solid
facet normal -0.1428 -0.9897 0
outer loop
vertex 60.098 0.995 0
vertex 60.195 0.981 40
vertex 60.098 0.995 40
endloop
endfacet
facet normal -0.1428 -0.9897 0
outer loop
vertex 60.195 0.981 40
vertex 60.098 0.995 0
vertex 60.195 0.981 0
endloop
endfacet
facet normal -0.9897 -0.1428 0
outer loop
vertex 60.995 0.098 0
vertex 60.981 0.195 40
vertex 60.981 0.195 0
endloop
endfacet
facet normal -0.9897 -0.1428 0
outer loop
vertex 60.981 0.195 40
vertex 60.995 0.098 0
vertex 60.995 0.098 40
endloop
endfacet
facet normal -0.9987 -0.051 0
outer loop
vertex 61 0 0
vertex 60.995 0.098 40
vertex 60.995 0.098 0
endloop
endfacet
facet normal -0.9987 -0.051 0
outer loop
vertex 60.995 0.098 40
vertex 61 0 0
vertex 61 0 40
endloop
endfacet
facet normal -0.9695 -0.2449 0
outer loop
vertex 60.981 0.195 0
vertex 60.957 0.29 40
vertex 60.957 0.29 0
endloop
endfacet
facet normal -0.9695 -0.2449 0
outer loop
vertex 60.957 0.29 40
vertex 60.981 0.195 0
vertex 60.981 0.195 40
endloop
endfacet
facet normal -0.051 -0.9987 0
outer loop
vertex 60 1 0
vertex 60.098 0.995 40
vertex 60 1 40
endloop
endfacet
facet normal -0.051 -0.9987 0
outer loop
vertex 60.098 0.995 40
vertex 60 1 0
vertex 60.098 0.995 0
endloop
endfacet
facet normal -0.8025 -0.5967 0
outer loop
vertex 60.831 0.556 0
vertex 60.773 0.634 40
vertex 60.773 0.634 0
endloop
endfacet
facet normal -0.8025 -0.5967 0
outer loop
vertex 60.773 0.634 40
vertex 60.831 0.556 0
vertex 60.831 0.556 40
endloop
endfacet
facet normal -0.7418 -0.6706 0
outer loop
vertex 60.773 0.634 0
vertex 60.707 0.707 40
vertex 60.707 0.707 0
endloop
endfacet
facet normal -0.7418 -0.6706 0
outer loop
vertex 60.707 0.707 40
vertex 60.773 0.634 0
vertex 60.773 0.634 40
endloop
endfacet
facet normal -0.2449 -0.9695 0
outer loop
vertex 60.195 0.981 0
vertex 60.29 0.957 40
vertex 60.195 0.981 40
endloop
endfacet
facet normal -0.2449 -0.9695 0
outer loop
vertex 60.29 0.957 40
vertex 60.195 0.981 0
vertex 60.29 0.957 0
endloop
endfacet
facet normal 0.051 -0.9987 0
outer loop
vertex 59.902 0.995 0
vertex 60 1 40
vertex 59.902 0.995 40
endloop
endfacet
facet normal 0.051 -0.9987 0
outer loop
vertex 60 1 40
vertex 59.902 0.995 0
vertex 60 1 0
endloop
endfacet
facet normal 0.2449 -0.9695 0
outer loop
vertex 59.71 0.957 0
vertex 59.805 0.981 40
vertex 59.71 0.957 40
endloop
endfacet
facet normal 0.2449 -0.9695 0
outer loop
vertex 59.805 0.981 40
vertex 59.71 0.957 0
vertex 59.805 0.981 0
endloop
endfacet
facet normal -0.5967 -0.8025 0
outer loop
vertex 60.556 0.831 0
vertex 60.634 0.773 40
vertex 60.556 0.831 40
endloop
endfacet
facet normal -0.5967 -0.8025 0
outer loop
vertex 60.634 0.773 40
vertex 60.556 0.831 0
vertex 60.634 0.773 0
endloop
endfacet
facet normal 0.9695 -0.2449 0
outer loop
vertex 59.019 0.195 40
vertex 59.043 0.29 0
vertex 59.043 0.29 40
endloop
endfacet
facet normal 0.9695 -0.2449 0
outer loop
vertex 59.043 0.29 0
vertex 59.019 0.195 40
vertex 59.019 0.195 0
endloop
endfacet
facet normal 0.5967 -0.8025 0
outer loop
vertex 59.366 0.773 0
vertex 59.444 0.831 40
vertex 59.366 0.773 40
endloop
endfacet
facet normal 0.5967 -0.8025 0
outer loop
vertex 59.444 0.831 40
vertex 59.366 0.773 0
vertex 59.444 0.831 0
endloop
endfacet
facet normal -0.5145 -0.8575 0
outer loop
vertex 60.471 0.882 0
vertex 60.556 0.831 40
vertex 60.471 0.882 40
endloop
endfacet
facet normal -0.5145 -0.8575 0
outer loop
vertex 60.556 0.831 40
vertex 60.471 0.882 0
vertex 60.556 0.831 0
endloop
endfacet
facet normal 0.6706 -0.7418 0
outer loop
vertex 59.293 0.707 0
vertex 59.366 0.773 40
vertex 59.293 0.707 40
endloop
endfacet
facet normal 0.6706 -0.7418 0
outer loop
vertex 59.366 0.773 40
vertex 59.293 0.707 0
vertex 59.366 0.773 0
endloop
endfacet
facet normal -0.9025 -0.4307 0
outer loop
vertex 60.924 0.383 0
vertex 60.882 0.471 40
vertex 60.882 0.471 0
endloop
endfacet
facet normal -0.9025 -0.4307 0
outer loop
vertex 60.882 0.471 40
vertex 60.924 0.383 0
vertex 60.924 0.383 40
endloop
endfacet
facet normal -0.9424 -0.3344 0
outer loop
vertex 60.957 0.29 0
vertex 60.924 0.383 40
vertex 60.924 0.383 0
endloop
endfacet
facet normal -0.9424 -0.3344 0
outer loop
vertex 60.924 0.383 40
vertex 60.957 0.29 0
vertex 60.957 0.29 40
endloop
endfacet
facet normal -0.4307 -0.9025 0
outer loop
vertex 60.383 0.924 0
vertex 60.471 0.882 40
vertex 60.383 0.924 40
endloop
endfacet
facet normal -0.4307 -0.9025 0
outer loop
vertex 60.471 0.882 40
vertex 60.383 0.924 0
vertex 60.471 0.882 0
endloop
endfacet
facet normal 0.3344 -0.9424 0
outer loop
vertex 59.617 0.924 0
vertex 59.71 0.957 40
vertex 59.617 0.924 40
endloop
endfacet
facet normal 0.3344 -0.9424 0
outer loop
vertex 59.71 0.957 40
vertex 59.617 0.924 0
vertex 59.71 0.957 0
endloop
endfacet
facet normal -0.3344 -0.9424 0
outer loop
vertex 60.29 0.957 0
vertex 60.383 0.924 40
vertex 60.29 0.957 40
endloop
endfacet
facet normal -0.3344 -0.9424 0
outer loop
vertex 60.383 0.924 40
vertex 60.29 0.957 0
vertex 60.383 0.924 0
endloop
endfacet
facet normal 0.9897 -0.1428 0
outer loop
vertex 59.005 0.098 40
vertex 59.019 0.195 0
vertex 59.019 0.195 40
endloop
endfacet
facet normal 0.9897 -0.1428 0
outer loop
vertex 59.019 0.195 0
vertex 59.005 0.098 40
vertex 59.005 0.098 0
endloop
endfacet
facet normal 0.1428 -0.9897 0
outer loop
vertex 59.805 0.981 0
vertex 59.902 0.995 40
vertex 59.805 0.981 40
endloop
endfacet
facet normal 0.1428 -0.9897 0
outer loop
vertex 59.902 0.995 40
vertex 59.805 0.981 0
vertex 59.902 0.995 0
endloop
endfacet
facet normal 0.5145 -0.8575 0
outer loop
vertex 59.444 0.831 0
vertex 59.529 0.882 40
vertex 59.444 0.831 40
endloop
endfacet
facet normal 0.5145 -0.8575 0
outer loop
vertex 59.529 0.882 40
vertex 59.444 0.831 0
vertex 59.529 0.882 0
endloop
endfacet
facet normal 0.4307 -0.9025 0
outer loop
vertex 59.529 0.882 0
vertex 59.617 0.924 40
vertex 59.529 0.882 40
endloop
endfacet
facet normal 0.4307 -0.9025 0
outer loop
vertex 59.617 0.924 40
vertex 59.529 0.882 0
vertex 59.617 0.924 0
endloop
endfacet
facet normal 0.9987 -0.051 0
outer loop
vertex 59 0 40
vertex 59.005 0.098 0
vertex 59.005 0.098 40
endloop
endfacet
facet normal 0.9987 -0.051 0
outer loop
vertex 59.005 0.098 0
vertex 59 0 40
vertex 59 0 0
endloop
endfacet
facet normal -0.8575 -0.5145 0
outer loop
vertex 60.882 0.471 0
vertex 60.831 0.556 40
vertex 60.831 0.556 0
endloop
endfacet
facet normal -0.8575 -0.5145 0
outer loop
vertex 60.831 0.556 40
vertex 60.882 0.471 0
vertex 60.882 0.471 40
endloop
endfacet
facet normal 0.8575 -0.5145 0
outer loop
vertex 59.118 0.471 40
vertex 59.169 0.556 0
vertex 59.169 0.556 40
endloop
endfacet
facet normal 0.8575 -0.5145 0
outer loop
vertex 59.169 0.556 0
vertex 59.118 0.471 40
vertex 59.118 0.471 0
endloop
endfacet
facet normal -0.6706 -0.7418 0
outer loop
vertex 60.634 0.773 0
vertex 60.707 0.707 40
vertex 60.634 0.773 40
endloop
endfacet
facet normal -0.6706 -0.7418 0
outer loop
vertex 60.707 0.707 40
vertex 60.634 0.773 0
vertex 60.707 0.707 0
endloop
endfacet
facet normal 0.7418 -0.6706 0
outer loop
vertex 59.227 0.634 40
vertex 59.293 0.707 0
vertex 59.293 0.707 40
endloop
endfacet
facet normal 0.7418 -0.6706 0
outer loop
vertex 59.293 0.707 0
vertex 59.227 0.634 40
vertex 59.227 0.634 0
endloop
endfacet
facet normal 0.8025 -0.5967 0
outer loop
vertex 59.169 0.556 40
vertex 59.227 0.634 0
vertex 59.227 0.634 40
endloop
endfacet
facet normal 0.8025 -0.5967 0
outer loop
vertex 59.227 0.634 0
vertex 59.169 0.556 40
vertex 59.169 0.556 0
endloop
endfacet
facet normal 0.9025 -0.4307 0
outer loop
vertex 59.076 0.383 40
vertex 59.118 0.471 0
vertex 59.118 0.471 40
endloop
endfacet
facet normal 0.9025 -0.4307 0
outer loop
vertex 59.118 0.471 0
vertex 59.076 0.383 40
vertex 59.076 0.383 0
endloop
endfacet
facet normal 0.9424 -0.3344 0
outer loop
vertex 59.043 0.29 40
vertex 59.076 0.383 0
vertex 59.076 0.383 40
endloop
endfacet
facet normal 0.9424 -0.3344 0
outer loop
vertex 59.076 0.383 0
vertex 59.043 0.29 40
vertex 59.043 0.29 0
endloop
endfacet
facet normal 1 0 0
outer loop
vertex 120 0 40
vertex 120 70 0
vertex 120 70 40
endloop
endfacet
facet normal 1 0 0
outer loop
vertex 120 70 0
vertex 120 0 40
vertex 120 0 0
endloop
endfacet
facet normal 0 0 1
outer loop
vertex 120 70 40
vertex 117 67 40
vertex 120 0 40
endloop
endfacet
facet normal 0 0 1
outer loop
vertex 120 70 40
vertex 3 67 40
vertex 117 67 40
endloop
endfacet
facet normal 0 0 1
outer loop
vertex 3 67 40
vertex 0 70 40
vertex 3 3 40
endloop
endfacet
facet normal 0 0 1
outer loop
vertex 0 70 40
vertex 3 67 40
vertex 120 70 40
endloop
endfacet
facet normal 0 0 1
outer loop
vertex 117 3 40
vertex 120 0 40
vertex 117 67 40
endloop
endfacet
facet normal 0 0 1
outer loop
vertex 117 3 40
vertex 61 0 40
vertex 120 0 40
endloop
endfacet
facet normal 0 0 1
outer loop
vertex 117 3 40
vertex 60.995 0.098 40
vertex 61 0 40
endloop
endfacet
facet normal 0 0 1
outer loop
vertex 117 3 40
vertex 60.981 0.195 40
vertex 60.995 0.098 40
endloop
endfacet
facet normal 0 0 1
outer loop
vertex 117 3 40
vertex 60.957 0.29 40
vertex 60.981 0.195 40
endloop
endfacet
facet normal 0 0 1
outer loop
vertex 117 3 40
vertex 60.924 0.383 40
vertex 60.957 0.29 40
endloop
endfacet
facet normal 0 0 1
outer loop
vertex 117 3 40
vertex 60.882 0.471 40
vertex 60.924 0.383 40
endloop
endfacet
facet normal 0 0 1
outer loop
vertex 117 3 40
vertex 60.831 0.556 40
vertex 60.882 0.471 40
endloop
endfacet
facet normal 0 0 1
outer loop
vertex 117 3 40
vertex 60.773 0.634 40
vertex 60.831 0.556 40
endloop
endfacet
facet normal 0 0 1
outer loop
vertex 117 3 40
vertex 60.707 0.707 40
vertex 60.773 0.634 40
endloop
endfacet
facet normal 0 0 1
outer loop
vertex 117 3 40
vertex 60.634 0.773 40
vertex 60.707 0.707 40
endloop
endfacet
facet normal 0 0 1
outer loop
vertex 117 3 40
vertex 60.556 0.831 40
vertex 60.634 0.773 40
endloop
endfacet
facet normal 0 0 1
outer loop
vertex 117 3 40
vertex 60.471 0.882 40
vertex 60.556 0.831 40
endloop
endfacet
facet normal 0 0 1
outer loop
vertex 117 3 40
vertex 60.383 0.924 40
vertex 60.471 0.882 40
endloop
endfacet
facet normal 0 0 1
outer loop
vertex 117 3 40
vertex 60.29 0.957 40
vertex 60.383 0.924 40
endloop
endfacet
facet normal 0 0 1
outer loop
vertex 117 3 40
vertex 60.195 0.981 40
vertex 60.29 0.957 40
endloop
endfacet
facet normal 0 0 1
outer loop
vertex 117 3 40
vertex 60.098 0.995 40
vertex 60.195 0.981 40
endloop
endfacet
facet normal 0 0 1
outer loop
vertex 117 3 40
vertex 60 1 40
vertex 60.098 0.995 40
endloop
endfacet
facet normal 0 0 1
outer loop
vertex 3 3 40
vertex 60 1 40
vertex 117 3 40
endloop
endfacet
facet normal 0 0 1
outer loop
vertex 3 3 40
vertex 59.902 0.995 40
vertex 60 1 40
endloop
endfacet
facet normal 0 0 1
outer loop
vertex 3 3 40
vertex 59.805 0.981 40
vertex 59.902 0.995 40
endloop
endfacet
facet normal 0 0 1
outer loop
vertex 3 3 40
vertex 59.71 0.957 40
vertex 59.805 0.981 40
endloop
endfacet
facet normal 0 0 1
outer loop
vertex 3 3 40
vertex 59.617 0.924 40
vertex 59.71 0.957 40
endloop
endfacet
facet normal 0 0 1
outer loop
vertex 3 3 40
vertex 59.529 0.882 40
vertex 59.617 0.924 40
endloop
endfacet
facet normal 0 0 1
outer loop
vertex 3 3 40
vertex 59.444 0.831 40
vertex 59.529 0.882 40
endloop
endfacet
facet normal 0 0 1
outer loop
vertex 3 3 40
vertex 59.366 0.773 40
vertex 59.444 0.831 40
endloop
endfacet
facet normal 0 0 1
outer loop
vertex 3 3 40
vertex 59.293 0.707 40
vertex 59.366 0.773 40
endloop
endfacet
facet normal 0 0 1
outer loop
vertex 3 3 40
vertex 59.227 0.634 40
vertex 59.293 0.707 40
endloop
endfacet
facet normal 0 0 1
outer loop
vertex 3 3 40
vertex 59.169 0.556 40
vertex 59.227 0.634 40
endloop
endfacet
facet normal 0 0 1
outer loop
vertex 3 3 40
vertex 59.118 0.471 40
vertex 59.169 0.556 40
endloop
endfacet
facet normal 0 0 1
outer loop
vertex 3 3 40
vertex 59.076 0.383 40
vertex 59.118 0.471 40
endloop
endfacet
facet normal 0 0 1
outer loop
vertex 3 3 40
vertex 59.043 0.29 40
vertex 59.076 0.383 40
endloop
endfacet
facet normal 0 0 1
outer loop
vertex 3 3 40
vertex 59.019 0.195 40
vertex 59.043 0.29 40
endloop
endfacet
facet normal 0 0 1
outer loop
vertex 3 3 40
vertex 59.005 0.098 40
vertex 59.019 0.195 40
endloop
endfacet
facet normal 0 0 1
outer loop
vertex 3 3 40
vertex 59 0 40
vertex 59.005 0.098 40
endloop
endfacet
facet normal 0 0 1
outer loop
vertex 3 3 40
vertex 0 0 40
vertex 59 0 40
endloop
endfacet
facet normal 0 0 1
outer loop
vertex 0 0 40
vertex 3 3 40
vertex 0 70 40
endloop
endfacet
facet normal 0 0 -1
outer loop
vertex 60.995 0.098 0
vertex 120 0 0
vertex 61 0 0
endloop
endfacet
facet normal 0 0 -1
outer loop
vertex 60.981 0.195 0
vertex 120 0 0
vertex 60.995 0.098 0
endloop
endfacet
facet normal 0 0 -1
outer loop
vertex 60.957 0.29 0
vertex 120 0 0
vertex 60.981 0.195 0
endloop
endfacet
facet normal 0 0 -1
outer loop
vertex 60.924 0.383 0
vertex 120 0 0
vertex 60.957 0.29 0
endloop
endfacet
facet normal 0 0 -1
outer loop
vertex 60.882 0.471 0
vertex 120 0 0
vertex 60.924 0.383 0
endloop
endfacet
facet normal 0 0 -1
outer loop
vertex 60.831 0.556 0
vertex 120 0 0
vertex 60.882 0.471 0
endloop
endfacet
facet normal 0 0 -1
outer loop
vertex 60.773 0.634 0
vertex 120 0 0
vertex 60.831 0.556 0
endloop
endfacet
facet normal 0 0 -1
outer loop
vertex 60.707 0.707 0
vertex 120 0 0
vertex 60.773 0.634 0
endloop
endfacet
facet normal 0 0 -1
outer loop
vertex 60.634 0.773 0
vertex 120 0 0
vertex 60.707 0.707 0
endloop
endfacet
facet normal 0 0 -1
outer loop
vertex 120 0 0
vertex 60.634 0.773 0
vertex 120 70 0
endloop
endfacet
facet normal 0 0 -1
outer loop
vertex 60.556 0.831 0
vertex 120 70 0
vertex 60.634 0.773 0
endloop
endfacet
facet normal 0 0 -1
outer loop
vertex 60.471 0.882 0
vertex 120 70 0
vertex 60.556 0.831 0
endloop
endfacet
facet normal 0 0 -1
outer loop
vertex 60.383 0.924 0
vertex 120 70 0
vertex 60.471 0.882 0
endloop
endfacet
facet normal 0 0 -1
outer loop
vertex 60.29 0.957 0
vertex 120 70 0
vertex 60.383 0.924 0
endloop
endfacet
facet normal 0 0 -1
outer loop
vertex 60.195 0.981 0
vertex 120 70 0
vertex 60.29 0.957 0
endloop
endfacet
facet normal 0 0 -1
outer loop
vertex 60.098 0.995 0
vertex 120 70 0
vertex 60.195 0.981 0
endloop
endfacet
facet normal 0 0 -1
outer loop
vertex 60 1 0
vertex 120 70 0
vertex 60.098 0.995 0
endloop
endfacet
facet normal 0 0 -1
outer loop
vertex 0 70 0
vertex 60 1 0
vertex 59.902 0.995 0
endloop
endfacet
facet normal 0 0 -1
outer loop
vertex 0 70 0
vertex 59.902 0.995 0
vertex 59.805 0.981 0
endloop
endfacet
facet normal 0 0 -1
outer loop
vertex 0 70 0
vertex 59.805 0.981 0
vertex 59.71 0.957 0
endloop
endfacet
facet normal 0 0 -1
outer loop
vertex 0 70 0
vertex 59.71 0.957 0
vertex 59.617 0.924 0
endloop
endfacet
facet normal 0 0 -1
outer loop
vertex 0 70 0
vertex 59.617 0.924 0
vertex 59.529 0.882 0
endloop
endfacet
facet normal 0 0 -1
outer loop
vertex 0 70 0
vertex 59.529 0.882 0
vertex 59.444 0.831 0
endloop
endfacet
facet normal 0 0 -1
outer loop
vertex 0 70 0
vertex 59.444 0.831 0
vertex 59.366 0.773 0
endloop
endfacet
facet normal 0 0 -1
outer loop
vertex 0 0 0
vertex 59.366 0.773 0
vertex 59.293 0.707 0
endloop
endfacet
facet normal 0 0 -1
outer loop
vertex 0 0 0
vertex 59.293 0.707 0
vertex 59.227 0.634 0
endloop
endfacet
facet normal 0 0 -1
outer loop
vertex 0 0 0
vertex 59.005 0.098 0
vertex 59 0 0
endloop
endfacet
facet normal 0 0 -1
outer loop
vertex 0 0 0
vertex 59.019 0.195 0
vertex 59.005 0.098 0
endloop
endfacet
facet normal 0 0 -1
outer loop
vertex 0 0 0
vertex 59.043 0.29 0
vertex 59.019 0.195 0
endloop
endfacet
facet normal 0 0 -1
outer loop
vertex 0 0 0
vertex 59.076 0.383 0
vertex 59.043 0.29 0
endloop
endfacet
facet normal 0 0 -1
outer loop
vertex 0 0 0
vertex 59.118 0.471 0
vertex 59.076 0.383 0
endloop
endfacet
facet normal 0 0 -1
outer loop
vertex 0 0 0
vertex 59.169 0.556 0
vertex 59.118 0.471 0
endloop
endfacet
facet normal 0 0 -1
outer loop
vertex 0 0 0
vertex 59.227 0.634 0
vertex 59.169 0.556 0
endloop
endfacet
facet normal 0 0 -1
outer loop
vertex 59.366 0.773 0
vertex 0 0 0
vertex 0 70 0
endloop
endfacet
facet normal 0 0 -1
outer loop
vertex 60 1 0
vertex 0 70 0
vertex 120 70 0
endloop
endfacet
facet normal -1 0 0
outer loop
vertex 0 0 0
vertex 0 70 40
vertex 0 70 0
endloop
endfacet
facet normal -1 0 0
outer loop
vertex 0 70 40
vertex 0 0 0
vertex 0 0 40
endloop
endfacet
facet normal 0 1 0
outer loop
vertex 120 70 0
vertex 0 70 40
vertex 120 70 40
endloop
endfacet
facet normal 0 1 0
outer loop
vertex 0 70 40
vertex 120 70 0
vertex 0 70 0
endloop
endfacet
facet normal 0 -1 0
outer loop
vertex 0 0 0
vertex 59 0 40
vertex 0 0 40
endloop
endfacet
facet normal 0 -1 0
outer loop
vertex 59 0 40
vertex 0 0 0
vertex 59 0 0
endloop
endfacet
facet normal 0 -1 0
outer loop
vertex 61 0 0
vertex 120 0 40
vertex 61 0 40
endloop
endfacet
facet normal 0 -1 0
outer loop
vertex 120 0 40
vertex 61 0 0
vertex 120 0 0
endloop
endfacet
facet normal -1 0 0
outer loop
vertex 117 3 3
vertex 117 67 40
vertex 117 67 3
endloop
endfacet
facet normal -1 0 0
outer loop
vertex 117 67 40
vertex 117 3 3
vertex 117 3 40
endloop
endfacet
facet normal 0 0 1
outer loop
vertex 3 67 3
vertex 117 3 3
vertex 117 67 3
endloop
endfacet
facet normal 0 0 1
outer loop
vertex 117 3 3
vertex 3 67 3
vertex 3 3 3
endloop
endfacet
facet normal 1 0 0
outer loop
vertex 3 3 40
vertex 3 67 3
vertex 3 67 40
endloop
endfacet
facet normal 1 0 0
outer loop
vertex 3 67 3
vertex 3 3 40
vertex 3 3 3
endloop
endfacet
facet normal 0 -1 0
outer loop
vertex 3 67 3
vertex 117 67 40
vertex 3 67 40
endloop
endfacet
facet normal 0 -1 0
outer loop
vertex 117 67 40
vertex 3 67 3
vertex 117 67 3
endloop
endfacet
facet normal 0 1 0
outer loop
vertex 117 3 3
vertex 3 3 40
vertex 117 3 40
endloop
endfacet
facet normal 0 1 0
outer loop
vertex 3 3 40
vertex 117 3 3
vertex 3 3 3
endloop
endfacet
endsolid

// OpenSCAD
$fn = 64;

// Outer dimensions (mm)
$outer_x = 120;
$outer_y = 70;
$outer_z = 40;

// Wall and floor thickness (mm)
$wall_thickness = 3;
$floor_thickness = 3;

// Inner dimensions (mm)
$inner_x = $outer_x - 2 * $wall_thickness;
$inner_y = $outer_y - 2 * $wall_thickness;
$inner_z = $outer_z - $floor_thickness;

// Platform dimensions (mm)
$platform_length = 60;
$platform_width = $inner_y;
$platform_height = 10;

// Hole dimensions (mm)
$hole_diameter = 2;
$hole_radius = $hole_diameter / 2;
$hole_z = 30;
$hole_y = 0;

difference() {
    // Main tank body (outer box)
    cube([
        $outer_x,
        $outer_y,
        $outer_z
    ], center = false);
    
    // Cut out inner cavity (open top)
    translate([
        $wall_thickness,
        $wall_thickness,
        $floor_thickness
    ])
    cube([
        $inner_x,
        $inner_y,
        $inner_z
    ], center = false);
    
    // Cut out platform cavity (space above platform)
    translate([
        ($outer_x - $platform_length) / 2,
        $wall_thickness,
        $floor_thickness + $platform_height
    ])
    cube([
        $platform_length,
        $platform_width,
        $outer_z - ($floor_thickness + $platform_height)
    ], center = false);
    
    // Cut out electrode holes (horizontal cylinders along X)
    for (side = [-1, 1]) {
        translate([
            side * ($outer_x / 2),
            $hole_y,
            $hole_z
        ])
        cylinder(
            r = $hole_radius,
            h = $outer_x + 0.1,
            axis = [1, 0, 0],
            center = true
        );
    }
}
